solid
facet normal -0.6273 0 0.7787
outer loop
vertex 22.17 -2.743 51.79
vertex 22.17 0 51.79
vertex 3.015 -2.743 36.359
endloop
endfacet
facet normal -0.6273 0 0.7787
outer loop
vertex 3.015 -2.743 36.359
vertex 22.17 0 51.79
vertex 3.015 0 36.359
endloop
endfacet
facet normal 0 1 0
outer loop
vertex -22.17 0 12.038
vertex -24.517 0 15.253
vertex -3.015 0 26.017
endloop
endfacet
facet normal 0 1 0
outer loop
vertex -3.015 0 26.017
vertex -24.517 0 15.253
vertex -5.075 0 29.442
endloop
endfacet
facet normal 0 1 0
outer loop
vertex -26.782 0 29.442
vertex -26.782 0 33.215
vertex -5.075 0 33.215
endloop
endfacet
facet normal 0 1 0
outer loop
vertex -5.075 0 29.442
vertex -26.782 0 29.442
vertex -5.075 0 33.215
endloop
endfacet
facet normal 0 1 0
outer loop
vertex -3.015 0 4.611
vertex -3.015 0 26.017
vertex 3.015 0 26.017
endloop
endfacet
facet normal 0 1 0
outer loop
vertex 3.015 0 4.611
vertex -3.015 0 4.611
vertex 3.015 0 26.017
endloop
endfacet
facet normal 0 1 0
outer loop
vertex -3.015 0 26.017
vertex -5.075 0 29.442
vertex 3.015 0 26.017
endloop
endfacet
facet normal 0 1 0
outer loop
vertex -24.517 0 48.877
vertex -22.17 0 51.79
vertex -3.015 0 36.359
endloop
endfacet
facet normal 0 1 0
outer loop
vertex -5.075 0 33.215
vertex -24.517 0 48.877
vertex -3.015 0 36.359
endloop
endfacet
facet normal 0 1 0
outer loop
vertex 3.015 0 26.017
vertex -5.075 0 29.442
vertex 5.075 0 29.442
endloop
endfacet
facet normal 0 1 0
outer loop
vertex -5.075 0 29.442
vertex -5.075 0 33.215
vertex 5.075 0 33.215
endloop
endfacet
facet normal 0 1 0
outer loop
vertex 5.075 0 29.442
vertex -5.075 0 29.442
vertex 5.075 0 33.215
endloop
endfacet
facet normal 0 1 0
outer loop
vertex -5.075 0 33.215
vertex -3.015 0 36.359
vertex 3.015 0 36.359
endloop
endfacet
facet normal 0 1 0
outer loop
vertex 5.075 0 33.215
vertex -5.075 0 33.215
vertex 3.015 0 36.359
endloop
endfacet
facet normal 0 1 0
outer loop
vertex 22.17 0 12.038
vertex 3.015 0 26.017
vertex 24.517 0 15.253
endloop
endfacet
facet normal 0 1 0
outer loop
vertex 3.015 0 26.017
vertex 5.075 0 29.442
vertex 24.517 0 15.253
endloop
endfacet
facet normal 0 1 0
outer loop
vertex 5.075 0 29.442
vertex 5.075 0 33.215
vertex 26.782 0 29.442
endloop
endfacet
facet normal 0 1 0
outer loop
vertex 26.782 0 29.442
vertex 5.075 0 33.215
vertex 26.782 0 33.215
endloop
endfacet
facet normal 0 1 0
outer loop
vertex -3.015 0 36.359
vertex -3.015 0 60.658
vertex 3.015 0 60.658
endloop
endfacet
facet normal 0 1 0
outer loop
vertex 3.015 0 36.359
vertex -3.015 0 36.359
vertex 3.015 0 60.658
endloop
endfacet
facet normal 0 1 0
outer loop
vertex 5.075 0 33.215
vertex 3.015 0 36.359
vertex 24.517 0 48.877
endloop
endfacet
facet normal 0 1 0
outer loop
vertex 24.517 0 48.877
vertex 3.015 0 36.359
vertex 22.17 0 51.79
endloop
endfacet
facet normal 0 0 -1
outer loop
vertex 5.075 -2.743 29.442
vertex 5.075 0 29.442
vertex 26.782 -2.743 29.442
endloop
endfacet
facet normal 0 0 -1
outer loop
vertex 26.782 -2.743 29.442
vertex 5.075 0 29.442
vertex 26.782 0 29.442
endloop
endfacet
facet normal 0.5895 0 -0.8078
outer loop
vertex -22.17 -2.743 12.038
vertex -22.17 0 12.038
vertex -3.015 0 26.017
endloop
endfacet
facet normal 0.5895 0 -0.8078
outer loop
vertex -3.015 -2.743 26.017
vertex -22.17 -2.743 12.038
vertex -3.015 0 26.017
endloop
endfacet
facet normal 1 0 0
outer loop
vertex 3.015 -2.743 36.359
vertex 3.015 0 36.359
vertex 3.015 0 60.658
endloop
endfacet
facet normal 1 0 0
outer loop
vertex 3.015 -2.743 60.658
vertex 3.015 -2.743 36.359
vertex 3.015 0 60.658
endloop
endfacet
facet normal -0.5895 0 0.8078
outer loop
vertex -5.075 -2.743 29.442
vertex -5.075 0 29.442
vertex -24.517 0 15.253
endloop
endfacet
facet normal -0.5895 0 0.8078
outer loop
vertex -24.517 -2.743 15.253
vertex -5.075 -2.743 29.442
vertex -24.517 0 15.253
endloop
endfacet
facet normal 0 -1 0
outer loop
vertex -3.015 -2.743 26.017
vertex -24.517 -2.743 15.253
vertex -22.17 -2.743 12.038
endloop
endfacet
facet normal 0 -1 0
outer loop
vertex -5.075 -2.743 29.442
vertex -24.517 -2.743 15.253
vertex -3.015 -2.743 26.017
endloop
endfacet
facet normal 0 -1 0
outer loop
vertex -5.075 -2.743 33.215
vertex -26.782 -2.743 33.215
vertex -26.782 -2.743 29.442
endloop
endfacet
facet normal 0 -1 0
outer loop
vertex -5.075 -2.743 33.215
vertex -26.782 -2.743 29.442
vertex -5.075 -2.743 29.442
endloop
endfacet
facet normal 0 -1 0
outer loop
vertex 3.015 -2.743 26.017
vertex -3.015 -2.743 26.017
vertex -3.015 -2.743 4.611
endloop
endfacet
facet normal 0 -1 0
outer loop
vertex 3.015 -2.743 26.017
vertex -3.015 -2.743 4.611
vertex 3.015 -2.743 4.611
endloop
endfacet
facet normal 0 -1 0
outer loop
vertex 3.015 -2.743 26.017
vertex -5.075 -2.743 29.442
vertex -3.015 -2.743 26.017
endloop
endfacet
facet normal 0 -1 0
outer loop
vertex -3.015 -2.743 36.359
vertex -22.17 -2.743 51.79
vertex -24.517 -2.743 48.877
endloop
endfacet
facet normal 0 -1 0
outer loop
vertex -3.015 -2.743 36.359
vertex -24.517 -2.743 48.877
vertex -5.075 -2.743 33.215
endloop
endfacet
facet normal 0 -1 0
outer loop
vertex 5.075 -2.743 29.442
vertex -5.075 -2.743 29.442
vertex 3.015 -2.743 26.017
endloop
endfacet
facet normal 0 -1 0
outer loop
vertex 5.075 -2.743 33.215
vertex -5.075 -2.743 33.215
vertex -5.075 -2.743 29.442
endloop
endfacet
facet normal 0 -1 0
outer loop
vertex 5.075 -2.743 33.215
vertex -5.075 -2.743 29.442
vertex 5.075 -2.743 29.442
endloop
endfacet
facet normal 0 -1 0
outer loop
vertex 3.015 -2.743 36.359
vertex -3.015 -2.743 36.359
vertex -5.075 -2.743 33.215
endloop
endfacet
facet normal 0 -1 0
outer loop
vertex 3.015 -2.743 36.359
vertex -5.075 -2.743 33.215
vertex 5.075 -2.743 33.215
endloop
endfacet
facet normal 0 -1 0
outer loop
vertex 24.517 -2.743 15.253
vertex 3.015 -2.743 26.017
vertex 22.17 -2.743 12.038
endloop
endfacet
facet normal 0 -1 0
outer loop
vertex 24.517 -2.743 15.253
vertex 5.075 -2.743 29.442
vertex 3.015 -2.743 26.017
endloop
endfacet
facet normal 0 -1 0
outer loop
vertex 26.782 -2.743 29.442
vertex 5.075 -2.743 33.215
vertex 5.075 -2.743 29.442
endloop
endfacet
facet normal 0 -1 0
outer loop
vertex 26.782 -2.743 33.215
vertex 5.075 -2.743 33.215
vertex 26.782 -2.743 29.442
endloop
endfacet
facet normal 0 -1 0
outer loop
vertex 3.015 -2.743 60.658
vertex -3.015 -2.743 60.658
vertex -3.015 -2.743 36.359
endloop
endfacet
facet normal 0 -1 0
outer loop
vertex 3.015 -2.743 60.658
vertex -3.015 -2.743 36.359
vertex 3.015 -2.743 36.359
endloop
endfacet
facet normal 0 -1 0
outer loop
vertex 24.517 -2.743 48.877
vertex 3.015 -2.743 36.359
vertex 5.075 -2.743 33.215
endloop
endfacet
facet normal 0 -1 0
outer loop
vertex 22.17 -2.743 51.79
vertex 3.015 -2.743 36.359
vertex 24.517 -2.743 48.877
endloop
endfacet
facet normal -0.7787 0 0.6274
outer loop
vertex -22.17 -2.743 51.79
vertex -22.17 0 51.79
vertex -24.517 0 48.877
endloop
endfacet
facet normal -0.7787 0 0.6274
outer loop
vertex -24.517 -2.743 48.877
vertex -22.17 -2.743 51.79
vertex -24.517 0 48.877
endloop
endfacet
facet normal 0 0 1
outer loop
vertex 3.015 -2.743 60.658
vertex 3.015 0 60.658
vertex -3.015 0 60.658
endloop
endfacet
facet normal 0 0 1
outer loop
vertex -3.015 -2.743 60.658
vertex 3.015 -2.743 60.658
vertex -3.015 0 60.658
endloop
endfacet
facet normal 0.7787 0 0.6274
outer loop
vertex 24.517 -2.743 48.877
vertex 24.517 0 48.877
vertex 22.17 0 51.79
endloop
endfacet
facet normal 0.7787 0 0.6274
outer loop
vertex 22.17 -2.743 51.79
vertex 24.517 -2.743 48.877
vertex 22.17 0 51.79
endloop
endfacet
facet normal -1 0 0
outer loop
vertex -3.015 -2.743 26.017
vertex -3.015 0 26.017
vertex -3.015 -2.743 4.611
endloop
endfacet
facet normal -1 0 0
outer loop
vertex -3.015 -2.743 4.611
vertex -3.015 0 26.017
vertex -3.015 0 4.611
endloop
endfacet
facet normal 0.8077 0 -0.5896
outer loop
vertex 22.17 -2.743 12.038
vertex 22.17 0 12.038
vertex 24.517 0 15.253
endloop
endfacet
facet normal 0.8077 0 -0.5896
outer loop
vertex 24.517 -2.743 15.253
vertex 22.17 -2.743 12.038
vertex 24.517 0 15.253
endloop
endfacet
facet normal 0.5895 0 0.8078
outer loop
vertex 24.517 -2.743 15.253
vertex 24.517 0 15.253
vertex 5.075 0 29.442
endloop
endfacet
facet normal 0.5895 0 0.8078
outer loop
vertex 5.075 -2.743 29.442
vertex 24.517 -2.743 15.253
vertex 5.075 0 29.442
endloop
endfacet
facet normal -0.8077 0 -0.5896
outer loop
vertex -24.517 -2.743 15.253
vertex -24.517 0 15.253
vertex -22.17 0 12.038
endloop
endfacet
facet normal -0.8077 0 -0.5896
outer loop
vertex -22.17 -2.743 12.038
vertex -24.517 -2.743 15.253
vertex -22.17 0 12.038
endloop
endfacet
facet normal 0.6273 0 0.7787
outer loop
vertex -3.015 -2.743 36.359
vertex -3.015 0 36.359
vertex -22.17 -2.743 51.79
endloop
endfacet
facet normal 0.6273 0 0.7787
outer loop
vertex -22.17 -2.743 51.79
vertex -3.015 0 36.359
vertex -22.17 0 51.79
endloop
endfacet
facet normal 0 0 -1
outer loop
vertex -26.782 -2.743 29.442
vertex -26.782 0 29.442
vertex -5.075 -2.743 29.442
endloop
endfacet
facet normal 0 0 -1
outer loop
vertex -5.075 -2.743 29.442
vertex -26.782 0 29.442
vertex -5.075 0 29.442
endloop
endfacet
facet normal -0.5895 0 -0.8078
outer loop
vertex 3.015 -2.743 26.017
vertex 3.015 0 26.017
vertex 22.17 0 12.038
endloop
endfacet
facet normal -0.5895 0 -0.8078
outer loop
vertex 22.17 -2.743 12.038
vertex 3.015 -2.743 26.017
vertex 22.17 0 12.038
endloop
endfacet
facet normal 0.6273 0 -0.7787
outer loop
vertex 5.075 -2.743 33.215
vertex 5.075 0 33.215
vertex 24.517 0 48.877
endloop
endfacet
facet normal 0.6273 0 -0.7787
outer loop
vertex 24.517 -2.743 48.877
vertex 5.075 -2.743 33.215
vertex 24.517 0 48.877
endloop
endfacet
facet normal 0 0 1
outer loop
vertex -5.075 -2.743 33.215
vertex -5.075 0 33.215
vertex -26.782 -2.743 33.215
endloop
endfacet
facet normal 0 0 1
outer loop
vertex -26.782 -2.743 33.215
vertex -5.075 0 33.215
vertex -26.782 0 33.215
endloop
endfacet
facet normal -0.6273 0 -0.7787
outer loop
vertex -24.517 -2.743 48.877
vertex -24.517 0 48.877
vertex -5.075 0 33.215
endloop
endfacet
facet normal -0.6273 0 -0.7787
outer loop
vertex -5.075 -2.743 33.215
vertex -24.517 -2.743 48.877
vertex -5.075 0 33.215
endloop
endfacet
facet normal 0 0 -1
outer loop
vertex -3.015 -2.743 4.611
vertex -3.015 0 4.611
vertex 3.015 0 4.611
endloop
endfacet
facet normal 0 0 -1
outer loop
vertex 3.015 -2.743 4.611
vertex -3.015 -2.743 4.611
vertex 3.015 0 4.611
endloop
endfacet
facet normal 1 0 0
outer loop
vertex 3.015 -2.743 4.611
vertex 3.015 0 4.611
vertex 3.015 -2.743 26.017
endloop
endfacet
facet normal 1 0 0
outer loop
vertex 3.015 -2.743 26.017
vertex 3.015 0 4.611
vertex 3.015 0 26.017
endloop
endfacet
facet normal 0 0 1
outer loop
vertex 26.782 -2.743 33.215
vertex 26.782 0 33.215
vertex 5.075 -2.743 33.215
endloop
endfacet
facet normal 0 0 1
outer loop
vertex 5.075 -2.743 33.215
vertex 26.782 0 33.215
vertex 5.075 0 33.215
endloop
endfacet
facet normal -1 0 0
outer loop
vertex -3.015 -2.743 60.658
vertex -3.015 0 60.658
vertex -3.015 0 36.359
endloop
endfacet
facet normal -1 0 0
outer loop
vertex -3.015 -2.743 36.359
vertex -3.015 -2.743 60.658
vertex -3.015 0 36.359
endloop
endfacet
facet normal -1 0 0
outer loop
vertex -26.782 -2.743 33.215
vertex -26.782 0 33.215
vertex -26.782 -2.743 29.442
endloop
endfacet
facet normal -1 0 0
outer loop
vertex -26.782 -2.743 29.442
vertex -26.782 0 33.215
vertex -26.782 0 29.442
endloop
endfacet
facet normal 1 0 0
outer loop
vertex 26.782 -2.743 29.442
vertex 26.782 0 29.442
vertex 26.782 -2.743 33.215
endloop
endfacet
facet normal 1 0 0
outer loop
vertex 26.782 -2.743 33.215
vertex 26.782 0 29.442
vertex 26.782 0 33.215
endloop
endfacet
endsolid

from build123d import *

# Parameters (mm, degrees)
F1_DEPTH = 3.048
F2_SCALE = 0.9


with BuildPart() as f1:
    # F0 (on Front) → F1 (new body)
    with BuildSketch(Plane.XZ):
        Polygon((3.3501721919, 67.3975870013), (0, 67.3975870013), (0, 5.1237931475), (3.3501721919, 5.1237931475), (3.3501721919, 28.9080845579), (24.633621797, 13.3751591098), (27.2410747923, 16.9479306787), (5.6389208675, 32.7134504914), (29.7574140131, 32.7134504914), (29.7574140131, 36.9055655311), (5.6389208675, 36.9055655311), (27.2410747923, 54.3072999545), (24.633621797, 57.5441382825), (3.3501721919, 40.3991378844), align=None)
        Polygon((0, 5.1237931475), (0, 67.3975870013), (-3.3501721919, 67.3975870013), (-3.3501721919, 40.3991378844), (-24.633621797, 57.5441382825), (-27.2410747923, 54.3072999545), (-5.6389208675, 36.9055655311), (-29.7574140131, 36.9055655311), (-29.7574140131, 32.7134504914), (-5.6389208675, 32.7134504914), (-27.2410747923, 16.9479306787), (-24.633621797, 13.3751591098), (-3.3501721919, 28.9080845579), (-3.3501721919, 5.1237931475), align=None)
    extrude(amount=F1_DEPTH)


with BuildPart() as f1_1:
    # F2: moved
    add(f1.part.scale(F2_SCALE))


solid = f1_1.part
